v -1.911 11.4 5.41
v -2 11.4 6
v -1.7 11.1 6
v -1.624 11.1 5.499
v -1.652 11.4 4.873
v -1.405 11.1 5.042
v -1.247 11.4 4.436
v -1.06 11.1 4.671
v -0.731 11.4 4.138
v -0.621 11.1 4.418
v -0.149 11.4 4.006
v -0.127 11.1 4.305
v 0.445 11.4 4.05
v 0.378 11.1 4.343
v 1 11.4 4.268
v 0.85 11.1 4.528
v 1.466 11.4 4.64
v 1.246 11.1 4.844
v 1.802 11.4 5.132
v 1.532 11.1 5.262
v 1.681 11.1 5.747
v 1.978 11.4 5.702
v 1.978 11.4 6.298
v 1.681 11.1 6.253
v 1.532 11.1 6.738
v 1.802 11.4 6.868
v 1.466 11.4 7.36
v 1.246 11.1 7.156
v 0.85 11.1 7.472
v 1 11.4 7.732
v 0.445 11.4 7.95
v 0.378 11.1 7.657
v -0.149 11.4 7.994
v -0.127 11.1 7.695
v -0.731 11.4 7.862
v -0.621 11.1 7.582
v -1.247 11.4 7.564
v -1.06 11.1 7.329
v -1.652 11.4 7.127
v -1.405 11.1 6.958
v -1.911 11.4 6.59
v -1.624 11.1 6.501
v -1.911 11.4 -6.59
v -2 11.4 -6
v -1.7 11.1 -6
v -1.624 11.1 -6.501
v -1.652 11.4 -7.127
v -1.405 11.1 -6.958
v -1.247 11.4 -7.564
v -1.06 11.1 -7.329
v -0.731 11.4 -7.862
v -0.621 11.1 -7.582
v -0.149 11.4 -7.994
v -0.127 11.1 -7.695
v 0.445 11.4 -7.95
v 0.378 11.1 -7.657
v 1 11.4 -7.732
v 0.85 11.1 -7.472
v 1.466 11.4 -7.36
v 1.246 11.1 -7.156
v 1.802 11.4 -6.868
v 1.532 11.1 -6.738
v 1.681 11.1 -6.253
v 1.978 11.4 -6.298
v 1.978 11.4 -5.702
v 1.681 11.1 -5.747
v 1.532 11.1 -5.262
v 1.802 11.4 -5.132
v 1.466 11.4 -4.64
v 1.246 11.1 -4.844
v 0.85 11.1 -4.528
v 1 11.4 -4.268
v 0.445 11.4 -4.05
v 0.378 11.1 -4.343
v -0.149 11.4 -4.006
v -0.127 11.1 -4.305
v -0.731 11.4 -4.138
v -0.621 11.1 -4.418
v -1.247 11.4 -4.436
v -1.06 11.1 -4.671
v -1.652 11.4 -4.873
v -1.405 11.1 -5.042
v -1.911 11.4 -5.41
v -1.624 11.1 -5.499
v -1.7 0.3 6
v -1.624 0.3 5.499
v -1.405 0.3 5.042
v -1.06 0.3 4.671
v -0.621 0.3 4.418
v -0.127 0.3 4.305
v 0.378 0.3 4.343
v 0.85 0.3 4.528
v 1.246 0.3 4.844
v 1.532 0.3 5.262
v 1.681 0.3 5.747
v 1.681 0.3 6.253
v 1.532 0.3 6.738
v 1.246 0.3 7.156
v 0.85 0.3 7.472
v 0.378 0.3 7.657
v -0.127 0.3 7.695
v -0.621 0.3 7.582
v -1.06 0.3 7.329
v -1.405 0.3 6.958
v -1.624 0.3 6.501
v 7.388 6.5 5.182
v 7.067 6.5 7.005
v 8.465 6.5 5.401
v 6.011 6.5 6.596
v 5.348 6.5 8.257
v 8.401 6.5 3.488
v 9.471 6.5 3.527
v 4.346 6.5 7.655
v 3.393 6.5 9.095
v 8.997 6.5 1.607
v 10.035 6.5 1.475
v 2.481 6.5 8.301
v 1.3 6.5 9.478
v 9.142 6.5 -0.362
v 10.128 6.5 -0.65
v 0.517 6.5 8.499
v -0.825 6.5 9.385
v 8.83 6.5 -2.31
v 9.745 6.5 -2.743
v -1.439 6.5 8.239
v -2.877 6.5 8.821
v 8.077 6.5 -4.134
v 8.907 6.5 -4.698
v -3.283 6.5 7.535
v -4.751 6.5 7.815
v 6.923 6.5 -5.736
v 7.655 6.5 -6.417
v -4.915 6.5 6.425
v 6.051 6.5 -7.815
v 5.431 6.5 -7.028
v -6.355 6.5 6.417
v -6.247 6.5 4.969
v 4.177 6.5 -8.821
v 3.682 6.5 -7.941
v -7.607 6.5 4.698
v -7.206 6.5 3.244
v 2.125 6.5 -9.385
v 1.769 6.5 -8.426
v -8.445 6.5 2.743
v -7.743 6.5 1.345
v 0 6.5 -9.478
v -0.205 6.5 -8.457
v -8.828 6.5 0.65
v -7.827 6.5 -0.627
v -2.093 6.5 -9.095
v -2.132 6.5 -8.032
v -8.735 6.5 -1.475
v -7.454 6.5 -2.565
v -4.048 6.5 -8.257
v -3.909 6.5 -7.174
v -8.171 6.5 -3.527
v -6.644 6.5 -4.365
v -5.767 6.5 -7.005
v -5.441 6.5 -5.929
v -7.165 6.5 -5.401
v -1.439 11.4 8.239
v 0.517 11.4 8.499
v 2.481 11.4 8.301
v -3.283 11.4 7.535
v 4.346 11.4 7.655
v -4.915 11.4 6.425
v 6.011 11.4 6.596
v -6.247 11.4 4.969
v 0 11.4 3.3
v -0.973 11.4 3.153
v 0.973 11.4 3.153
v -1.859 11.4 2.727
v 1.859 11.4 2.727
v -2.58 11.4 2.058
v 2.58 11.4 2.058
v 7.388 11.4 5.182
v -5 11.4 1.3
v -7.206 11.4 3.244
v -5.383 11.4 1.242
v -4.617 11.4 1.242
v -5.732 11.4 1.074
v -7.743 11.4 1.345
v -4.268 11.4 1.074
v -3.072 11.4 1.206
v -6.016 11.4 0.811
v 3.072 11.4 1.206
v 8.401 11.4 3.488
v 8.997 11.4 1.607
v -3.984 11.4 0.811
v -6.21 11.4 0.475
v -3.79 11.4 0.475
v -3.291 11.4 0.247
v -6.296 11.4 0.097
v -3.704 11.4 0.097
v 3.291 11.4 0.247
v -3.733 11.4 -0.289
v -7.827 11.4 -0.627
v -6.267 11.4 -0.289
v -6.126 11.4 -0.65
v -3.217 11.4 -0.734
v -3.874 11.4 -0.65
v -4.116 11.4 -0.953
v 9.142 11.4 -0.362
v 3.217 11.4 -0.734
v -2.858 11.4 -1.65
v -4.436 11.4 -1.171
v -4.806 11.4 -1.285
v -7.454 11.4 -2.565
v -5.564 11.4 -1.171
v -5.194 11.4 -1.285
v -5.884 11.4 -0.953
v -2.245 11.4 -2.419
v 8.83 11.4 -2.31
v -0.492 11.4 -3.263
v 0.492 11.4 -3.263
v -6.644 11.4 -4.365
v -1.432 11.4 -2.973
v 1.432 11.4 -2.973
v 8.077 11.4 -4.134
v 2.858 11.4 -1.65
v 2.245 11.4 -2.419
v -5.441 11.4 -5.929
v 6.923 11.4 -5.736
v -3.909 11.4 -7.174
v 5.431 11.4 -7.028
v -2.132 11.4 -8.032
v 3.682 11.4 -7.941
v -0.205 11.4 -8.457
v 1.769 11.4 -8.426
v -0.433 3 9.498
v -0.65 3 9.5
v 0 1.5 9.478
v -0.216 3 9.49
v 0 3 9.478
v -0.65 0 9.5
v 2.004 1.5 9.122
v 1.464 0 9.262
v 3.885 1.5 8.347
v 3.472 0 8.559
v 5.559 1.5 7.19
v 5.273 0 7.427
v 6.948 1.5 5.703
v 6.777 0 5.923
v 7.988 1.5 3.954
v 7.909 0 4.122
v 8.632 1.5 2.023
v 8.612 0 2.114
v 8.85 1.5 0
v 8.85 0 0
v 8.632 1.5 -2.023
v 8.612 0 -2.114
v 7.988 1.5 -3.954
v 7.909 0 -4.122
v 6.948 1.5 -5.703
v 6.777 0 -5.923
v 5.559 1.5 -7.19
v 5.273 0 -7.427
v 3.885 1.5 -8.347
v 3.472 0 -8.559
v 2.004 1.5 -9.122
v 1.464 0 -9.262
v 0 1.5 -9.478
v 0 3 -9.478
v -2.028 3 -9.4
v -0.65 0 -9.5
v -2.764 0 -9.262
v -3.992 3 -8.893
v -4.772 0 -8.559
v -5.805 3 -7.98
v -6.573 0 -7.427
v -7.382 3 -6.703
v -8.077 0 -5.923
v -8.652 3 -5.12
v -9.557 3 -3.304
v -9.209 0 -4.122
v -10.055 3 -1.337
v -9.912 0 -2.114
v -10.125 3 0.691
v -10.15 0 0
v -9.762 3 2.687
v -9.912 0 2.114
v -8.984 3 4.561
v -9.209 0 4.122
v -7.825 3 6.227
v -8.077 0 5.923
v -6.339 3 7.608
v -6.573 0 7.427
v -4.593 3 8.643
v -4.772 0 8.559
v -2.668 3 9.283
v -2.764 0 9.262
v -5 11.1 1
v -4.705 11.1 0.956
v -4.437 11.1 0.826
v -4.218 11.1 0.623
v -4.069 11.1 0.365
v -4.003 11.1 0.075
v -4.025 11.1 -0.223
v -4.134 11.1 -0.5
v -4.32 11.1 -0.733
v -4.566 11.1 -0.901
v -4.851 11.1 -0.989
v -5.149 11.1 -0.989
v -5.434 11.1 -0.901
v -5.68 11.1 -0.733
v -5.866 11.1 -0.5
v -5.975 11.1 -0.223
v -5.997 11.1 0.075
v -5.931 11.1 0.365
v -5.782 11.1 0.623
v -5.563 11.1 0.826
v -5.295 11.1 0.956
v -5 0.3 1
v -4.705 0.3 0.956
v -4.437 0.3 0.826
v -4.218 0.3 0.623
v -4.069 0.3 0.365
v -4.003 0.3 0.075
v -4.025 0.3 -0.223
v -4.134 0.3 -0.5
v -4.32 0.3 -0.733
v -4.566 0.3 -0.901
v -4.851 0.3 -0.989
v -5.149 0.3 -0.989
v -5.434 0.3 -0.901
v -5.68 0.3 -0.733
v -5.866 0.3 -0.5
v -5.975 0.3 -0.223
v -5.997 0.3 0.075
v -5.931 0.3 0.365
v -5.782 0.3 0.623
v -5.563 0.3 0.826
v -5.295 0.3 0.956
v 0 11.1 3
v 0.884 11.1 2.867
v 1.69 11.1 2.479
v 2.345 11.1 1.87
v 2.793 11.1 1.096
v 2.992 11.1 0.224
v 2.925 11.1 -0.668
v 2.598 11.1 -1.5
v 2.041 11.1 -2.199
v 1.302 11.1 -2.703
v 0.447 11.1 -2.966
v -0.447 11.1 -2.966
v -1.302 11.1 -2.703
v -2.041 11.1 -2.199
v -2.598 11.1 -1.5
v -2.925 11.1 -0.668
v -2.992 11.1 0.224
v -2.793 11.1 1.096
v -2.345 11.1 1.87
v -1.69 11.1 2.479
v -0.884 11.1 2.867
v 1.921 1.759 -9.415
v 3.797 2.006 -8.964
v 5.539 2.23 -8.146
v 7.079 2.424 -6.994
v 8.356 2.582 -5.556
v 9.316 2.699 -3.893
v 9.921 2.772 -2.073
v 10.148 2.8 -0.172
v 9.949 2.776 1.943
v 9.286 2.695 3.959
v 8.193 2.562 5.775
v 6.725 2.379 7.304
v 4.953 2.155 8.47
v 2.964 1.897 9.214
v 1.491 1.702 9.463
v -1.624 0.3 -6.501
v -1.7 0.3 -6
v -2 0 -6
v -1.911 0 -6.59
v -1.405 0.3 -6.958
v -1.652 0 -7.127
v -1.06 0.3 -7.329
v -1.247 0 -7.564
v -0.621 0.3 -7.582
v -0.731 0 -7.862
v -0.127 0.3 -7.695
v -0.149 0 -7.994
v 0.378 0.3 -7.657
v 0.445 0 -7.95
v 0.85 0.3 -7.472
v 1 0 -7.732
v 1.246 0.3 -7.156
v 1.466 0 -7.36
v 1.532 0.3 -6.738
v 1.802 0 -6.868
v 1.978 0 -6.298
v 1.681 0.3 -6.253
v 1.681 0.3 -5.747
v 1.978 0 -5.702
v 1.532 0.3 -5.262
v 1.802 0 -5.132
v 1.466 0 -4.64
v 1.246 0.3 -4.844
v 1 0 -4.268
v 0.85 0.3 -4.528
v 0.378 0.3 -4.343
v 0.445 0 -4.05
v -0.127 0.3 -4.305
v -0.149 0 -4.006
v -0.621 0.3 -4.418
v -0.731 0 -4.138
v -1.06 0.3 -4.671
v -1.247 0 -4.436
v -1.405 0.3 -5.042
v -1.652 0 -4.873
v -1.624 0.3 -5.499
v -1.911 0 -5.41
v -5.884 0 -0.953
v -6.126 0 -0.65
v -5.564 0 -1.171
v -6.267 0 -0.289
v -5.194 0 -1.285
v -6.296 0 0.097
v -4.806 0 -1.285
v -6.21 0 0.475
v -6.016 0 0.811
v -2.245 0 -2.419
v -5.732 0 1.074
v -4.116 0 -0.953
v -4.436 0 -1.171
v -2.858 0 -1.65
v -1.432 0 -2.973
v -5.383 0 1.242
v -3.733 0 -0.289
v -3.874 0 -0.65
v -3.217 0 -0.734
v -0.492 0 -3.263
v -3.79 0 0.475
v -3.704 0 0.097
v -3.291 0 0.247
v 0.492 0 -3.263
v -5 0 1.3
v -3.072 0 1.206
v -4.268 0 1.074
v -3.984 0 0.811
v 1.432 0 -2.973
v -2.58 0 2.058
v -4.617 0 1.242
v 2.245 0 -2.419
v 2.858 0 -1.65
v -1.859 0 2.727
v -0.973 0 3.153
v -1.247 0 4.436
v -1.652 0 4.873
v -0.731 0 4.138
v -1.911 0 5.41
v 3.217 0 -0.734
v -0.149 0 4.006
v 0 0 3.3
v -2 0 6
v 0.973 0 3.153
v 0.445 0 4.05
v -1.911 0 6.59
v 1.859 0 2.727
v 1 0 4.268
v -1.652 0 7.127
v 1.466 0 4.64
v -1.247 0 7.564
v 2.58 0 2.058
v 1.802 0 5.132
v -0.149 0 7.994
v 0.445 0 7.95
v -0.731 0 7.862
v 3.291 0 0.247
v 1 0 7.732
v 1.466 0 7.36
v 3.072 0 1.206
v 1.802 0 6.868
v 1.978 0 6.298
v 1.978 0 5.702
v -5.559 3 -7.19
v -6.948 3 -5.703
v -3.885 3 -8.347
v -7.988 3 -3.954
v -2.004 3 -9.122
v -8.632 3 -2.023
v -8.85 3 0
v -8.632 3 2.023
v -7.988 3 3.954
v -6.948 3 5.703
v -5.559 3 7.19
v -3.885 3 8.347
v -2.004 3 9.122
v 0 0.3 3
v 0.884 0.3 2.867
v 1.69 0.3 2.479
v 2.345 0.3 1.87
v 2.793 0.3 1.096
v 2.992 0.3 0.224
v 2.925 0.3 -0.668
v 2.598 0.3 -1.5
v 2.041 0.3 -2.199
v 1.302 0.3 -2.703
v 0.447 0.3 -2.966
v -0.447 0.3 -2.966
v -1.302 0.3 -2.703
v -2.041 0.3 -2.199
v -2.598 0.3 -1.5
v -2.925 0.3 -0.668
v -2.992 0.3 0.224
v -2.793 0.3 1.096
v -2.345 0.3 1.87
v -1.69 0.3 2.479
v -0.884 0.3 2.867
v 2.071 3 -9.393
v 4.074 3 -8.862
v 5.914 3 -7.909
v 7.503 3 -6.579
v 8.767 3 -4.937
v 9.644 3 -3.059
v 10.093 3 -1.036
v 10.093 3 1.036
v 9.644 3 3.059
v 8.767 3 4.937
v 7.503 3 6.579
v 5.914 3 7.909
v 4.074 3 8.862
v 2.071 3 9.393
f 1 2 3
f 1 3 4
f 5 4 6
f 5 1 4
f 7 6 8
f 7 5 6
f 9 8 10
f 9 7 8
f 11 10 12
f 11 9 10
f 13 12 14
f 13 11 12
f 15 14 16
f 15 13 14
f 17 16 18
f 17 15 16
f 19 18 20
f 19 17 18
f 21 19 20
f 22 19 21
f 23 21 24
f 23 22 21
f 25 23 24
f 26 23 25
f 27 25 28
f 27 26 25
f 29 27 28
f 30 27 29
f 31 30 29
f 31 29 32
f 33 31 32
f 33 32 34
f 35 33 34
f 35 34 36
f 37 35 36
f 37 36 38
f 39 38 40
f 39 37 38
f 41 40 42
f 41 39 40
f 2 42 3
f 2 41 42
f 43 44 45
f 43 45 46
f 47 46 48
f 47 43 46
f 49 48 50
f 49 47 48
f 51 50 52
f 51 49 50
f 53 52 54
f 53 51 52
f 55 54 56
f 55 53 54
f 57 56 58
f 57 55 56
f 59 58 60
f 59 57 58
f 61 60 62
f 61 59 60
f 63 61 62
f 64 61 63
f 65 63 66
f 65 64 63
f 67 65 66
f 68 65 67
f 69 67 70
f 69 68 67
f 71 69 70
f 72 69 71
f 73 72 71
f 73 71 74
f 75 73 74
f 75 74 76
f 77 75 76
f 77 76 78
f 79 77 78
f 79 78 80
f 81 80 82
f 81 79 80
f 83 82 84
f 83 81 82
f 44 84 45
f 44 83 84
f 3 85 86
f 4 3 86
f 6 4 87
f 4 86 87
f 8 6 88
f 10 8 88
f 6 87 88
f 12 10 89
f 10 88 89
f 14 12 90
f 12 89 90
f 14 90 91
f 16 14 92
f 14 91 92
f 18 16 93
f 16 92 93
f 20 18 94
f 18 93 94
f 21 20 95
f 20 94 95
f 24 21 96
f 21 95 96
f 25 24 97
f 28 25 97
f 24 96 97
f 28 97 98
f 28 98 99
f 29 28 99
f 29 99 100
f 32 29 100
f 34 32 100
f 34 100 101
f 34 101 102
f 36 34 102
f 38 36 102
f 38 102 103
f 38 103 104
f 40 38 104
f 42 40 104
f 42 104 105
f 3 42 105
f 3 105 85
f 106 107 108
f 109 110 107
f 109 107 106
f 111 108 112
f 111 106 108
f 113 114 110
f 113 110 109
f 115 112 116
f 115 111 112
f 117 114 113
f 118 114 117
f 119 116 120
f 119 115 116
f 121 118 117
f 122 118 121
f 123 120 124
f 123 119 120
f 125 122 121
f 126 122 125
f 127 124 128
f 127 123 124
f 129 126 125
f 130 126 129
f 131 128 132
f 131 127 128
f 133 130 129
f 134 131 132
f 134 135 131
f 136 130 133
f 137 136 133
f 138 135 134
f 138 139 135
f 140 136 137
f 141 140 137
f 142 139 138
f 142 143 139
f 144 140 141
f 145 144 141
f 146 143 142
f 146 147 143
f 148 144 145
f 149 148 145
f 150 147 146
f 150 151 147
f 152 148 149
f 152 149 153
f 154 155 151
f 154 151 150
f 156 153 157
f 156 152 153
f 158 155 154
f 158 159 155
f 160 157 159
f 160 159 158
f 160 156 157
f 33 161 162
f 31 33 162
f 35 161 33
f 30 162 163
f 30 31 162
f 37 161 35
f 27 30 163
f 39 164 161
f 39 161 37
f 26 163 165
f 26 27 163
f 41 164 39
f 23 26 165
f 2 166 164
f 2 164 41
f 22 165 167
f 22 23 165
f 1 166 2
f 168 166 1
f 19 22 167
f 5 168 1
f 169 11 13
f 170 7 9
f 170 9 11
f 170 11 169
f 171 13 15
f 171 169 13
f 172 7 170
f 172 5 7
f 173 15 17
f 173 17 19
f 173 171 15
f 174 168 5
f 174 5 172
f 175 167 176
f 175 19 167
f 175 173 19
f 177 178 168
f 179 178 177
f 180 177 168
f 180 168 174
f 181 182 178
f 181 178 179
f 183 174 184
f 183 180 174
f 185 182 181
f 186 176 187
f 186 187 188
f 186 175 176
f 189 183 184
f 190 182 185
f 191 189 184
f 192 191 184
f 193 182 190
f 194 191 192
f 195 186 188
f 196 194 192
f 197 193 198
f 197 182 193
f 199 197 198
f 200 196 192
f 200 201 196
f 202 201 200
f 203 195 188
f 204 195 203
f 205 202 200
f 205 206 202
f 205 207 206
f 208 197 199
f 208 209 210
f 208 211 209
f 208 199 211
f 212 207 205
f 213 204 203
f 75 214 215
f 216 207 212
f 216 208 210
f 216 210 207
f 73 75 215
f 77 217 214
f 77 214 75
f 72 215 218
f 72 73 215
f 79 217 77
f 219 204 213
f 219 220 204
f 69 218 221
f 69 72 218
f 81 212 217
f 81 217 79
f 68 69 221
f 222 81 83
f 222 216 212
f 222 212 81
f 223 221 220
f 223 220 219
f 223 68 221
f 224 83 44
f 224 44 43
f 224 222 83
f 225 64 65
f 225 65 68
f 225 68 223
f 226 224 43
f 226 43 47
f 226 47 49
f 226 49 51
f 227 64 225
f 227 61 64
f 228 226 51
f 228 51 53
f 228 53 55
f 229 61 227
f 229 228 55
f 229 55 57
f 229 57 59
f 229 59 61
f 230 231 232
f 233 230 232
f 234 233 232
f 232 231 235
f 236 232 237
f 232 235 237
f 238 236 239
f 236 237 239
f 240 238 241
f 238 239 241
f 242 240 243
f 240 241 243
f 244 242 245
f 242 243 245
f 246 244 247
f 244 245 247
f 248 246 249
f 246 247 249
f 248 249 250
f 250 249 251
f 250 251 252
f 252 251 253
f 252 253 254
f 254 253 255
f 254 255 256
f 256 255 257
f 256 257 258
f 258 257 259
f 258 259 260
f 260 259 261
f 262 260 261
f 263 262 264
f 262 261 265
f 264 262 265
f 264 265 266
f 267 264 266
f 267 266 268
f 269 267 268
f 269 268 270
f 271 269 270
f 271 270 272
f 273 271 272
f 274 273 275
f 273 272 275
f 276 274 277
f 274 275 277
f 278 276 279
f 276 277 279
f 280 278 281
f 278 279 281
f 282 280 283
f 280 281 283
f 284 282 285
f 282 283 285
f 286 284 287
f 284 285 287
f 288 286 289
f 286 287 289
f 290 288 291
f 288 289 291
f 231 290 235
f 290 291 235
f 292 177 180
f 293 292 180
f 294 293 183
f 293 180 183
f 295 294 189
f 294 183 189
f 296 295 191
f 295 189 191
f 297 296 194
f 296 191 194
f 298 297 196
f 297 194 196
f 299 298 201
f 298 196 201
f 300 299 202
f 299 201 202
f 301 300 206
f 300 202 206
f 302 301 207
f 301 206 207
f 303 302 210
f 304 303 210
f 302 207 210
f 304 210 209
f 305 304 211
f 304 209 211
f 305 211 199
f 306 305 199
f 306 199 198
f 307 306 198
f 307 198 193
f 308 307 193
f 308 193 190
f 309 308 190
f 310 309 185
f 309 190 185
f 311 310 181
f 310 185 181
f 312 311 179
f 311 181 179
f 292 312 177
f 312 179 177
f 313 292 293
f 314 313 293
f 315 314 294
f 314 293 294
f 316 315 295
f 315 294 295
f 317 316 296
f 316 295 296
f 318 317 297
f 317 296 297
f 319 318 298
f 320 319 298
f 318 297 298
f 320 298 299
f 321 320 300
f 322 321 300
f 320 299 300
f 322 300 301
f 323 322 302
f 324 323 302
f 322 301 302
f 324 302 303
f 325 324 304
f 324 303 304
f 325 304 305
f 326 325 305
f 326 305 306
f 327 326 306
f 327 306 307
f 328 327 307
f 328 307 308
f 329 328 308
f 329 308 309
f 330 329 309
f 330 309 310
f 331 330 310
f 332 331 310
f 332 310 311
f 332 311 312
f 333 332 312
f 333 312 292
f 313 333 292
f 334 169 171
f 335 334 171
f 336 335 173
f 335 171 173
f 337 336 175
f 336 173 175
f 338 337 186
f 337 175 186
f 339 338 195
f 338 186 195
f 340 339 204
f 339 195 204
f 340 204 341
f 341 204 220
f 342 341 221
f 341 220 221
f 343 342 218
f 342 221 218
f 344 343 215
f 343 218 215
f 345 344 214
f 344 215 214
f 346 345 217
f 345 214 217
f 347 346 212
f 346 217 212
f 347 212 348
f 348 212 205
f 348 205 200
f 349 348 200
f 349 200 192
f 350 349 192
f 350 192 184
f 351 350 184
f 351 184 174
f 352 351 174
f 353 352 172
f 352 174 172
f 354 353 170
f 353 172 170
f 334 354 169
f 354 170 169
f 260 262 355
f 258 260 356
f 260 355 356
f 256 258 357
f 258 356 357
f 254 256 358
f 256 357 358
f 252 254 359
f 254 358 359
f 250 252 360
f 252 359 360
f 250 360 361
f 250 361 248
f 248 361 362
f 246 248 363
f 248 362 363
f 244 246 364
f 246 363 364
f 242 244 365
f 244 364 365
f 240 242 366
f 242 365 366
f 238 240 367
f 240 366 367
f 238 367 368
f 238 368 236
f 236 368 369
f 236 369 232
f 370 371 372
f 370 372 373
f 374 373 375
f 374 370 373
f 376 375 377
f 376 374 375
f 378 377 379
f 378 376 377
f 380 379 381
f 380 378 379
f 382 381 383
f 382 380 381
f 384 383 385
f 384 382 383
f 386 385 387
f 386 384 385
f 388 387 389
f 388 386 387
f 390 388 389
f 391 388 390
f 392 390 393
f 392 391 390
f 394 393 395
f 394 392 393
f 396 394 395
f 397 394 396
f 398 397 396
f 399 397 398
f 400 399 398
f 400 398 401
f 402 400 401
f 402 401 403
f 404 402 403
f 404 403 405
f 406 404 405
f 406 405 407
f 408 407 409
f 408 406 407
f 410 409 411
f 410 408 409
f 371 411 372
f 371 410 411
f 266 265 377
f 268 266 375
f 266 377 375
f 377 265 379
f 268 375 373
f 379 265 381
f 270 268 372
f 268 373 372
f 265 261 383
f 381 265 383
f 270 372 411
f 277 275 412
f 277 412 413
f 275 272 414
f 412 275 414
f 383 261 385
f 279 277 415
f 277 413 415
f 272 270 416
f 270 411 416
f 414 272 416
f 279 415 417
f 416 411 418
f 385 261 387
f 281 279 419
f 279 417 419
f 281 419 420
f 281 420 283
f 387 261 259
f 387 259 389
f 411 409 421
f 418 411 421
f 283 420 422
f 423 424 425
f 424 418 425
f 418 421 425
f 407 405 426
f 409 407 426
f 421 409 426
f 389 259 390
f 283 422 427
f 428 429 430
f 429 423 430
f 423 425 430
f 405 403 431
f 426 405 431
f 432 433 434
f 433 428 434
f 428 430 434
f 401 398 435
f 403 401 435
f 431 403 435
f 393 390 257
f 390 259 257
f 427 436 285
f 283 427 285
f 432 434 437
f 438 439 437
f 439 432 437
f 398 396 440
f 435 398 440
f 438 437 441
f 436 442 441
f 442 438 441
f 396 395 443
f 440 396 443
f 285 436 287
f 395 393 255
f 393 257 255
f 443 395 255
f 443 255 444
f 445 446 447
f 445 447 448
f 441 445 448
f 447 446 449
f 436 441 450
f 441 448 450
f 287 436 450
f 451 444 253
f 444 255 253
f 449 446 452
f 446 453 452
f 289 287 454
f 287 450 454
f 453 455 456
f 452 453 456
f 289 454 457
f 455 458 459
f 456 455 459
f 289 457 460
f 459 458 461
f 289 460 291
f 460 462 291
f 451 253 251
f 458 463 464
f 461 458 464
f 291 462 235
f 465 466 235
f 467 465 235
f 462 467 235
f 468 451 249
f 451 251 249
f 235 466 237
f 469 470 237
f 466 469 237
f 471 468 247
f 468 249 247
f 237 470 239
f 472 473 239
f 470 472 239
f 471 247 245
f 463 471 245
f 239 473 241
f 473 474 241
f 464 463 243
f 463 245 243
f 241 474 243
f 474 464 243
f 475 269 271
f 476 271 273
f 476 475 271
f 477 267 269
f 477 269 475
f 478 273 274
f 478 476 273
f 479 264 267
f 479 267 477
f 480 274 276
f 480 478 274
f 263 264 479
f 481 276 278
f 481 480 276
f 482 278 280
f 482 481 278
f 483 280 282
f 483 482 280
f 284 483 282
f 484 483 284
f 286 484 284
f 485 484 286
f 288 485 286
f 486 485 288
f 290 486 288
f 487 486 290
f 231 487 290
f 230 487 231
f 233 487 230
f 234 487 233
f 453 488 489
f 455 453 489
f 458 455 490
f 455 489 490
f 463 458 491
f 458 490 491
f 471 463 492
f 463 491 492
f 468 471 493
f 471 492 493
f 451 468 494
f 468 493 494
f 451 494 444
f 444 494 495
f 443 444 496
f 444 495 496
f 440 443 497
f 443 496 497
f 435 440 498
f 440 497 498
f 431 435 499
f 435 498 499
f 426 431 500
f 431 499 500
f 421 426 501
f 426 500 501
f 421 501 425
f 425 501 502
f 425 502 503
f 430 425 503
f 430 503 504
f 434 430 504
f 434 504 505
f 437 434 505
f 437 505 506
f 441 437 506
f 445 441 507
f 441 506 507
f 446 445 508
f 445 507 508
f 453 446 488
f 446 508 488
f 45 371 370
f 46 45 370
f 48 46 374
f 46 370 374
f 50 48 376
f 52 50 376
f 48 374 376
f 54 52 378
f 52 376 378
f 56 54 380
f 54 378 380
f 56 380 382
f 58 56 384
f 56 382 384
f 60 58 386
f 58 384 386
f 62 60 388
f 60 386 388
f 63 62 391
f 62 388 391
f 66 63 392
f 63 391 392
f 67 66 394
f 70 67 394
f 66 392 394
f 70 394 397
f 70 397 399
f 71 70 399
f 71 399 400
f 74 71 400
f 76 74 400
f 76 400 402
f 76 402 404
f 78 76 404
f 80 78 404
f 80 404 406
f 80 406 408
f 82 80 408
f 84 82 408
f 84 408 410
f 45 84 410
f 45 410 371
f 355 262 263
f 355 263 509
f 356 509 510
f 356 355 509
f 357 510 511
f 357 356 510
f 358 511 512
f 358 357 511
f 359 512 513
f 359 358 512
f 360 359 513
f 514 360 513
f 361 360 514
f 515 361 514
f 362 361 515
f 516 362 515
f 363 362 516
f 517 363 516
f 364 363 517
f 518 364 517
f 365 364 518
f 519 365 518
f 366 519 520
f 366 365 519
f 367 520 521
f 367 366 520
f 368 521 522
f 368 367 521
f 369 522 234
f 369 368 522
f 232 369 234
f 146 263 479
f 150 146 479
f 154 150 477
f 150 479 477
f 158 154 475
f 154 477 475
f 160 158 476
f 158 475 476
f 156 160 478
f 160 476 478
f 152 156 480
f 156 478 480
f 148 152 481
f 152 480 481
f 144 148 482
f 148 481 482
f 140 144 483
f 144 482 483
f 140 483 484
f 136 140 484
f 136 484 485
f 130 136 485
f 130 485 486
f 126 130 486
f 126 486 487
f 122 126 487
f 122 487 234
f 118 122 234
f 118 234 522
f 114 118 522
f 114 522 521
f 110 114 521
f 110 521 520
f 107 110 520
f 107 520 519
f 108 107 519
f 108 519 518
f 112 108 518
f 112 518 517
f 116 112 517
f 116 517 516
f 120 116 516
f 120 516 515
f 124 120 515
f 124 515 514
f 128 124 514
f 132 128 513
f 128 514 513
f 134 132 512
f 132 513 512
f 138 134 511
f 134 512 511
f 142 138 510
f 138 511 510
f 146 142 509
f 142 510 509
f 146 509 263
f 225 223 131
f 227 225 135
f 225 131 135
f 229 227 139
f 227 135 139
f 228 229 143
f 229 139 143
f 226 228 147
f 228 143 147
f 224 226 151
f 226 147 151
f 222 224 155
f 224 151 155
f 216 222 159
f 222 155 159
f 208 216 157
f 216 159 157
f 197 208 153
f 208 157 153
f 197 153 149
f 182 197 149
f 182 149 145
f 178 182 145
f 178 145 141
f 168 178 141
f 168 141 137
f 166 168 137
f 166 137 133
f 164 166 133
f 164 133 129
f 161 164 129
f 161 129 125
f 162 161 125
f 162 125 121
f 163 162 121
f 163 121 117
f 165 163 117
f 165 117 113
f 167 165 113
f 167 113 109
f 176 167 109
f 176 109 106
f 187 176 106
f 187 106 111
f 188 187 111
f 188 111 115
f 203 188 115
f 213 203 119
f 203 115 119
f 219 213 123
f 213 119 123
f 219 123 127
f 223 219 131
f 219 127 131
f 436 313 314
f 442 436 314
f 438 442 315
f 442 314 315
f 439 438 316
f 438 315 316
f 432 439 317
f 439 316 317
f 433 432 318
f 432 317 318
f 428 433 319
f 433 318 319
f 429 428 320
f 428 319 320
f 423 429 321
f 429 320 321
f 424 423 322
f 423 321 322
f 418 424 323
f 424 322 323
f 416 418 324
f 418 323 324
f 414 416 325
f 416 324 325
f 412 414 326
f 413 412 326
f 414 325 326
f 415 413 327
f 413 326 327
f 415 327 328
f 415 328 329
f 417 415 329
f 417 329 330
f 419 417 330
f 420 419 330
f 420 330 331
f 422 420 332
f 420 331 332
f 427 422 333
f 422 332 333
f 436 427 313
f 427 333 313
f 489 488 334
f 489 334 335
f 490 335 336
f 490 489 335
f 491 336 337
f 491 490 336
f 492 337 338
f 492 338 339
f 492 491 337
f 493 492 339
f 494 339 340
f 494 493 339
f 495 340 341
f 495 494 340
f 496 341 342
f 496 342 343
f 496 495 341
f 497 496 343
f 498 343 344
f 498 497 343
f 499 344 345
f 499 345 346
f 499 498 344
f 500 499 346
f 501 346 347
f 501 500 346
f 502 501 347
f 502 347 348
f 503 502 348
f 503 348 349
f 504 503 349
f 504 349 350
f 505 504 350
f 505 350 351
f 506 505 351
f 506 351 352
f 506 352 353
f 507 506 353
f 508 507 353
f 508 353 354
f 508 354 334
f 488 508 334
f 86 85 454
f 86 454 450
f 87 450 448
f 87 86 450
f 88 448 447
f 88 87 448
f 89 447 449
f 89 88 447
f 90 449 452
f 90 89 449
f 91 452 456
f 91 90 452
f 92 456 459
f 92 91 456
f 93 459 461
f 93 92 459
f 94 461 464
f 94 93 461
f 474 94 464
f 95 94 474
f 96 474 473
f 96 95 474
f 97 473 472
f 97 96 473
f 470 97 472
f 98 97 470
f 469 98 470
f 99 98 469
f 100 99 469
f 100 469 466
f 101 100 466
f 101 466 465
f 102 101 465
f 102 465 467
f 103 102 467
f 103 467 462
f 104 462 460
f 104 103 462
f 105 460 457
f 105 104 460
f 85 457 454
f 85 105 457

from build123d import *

# Parameters (mm, degrees)
SKETCH1_R            = 9.5
SKETCH1_R_2          = 3
BOSS_EXTRUDE1_DEPTH  = 3
SKETCH7_R            = 8.5
SKETCH7_R_2          = 3
BOSS_EXTRUDE5_DEPTH  = 8.4
SKETCH8_R            = 9.5
SKETCH8_R_2          = 8.5
BOSS_EXTRUDE6_DEPTH  = 3.5
CHAMFER1_SIZE        = 1.5
SKETCH12_R           = 3
SKETCH12_R_2         = 1
CUT_EXTRUDE4_DEPTH   = 18.978668035
M3_CLEARANCE_HOLE1_D = 3.4
CHAMFER2_SIZE        = 0.3


with BuildPart() as part:
    # Sketch1 → Boss-Extrude1 (new body)
    with BuildSketch(Plane(origin=(0, 0, 0), x_dir=(1, 0, 0), z_dir=(0, 1, 0))):
        with Locations(Location((-0.65, 0, 0), (0, 0, 270))):
            Circle(SKETCH1_R)
        with Locations(Location((0, 0, 0), (0, 0, 270))):
            Circle(SKETCH1_R_2, mode=Mode.SUBTRACT)
    extrude(amount=BOSS_EXTRUDE1_DEPTH)

    # Sketch7 → Boss-Extrude5 (add)
    with BuildSketch(Plane(origin=(0, 3, 0), x_dir=(1, 0, 0), z_dir=(0, 1, 0))):
        with Locations(Location((0.65, 0, 0), (0, 0, 42.437907805))):
            Circle(SKETCH7_R)
        with Locations(Location((0, 0, 0), (0, 0, 270))):
            Circle(SKETCH7_R_2, mode=Mode.SUBTRACT)
    extrude(amount=BOSS_EXTRUDE5_DEPTH)

    # Sketch8 → Boss-Extrude6 (add)
    with BuildSketch(Plane(origin=(0, 3, 0), x_dir=(1, 0, 0), z_dir=(0, 1, 0))):
        with Locations(Location((0.65, 0, 0), (0, 0, 93.923302734))):
            Circle(SKETCH8_R)
        with Locations(Location((0.65, 0, 0), (0, 0, 270))):
            Circle(SKETCH8_R_2, mode=Mode.SUBTRACT)
    extrude(amount=BOSS_EXTRUDE6_DEPTH)

    # Chamfer1
    # the kernel refuses this chamfer: 1.5 mm, written as the material it adds along each edge
    with BuildSketch(Plane(origin=(-0.65, 3, 0), x_dir=(-0.3317687677714116, 0, -0.9433607394477679), z_dir=(-0.9433607394477679, 0, 0.3317687677714116))) as chamfer1_piece_1_section:
        Polygon((9.5, CHAMFER1_SIZE), (9.5 + CHAMFER1_SIZE, 0), (9.5, 0), align=None)
    chamfer1_piece_1 = revolve(axis=Axis((-0.65, 3, 0), (0, -1, 0)), revolution_arc=218.752335407, mode=Mode.PRIVATE)
    chamfer1_piece_1 = chamfer1_piece_1 & Plane(origin=(0.65, 2.170447869, 0), x_dir=(-0.06842105263614455, 0, -0.9976565338613094), z_dir=(0, -1, 0)) * Cylinder(9.5, 44, mode=Mode.PRIVATE)
    add(chamfer1_piece_1)

    # Sketch12 → Cut-Extrude4 (cut, through all)
    with BuildSketch(Plane(origin=(0, 11.4, 0), x_dir=(1, 0, 0), z_dir=(0, 1, 0))):
        with Locations(Location((0, 0, 0), (0, 0, 270))):
            Circle(SKETCH12_R)
        with Locations(Location((-5, 0, 0), (0, 0, 270))):
            Circle(SKETCH12_R_2)
    extrude(amount=-CUT_EXTRUDE4_DEPTH, mode=Mode.SUBTRACT)

    # M3 Clearance Hole1 (through all)
    with Locations(Plane(origin=(0, 11.4, 0), x_dir=(1, 0, 0), z_dir=(0, 1, 0))):
        with Locations((0, 6), (0, -6)):
            Hole(M3_CLEARANCE_HOLE1_D / 2)

    # Chamfer2
    chamfer2_edges = [part.edges().sort_by_distance(p)[0] for p in [
        (0, 11.4, -3),
        (-5, 0, -1),
        (-5, 11.4, -1),
        (0, 0, -3),
        (1.7, 11.4, 6),
        (1.7, 0, 6),
        (1.7, 11.4, -6),
        (1.7, 0, -6),
    ]]
    chamfer(chamfer2_edges, length=CHAMFER2_SIZE)


solid = part.part
